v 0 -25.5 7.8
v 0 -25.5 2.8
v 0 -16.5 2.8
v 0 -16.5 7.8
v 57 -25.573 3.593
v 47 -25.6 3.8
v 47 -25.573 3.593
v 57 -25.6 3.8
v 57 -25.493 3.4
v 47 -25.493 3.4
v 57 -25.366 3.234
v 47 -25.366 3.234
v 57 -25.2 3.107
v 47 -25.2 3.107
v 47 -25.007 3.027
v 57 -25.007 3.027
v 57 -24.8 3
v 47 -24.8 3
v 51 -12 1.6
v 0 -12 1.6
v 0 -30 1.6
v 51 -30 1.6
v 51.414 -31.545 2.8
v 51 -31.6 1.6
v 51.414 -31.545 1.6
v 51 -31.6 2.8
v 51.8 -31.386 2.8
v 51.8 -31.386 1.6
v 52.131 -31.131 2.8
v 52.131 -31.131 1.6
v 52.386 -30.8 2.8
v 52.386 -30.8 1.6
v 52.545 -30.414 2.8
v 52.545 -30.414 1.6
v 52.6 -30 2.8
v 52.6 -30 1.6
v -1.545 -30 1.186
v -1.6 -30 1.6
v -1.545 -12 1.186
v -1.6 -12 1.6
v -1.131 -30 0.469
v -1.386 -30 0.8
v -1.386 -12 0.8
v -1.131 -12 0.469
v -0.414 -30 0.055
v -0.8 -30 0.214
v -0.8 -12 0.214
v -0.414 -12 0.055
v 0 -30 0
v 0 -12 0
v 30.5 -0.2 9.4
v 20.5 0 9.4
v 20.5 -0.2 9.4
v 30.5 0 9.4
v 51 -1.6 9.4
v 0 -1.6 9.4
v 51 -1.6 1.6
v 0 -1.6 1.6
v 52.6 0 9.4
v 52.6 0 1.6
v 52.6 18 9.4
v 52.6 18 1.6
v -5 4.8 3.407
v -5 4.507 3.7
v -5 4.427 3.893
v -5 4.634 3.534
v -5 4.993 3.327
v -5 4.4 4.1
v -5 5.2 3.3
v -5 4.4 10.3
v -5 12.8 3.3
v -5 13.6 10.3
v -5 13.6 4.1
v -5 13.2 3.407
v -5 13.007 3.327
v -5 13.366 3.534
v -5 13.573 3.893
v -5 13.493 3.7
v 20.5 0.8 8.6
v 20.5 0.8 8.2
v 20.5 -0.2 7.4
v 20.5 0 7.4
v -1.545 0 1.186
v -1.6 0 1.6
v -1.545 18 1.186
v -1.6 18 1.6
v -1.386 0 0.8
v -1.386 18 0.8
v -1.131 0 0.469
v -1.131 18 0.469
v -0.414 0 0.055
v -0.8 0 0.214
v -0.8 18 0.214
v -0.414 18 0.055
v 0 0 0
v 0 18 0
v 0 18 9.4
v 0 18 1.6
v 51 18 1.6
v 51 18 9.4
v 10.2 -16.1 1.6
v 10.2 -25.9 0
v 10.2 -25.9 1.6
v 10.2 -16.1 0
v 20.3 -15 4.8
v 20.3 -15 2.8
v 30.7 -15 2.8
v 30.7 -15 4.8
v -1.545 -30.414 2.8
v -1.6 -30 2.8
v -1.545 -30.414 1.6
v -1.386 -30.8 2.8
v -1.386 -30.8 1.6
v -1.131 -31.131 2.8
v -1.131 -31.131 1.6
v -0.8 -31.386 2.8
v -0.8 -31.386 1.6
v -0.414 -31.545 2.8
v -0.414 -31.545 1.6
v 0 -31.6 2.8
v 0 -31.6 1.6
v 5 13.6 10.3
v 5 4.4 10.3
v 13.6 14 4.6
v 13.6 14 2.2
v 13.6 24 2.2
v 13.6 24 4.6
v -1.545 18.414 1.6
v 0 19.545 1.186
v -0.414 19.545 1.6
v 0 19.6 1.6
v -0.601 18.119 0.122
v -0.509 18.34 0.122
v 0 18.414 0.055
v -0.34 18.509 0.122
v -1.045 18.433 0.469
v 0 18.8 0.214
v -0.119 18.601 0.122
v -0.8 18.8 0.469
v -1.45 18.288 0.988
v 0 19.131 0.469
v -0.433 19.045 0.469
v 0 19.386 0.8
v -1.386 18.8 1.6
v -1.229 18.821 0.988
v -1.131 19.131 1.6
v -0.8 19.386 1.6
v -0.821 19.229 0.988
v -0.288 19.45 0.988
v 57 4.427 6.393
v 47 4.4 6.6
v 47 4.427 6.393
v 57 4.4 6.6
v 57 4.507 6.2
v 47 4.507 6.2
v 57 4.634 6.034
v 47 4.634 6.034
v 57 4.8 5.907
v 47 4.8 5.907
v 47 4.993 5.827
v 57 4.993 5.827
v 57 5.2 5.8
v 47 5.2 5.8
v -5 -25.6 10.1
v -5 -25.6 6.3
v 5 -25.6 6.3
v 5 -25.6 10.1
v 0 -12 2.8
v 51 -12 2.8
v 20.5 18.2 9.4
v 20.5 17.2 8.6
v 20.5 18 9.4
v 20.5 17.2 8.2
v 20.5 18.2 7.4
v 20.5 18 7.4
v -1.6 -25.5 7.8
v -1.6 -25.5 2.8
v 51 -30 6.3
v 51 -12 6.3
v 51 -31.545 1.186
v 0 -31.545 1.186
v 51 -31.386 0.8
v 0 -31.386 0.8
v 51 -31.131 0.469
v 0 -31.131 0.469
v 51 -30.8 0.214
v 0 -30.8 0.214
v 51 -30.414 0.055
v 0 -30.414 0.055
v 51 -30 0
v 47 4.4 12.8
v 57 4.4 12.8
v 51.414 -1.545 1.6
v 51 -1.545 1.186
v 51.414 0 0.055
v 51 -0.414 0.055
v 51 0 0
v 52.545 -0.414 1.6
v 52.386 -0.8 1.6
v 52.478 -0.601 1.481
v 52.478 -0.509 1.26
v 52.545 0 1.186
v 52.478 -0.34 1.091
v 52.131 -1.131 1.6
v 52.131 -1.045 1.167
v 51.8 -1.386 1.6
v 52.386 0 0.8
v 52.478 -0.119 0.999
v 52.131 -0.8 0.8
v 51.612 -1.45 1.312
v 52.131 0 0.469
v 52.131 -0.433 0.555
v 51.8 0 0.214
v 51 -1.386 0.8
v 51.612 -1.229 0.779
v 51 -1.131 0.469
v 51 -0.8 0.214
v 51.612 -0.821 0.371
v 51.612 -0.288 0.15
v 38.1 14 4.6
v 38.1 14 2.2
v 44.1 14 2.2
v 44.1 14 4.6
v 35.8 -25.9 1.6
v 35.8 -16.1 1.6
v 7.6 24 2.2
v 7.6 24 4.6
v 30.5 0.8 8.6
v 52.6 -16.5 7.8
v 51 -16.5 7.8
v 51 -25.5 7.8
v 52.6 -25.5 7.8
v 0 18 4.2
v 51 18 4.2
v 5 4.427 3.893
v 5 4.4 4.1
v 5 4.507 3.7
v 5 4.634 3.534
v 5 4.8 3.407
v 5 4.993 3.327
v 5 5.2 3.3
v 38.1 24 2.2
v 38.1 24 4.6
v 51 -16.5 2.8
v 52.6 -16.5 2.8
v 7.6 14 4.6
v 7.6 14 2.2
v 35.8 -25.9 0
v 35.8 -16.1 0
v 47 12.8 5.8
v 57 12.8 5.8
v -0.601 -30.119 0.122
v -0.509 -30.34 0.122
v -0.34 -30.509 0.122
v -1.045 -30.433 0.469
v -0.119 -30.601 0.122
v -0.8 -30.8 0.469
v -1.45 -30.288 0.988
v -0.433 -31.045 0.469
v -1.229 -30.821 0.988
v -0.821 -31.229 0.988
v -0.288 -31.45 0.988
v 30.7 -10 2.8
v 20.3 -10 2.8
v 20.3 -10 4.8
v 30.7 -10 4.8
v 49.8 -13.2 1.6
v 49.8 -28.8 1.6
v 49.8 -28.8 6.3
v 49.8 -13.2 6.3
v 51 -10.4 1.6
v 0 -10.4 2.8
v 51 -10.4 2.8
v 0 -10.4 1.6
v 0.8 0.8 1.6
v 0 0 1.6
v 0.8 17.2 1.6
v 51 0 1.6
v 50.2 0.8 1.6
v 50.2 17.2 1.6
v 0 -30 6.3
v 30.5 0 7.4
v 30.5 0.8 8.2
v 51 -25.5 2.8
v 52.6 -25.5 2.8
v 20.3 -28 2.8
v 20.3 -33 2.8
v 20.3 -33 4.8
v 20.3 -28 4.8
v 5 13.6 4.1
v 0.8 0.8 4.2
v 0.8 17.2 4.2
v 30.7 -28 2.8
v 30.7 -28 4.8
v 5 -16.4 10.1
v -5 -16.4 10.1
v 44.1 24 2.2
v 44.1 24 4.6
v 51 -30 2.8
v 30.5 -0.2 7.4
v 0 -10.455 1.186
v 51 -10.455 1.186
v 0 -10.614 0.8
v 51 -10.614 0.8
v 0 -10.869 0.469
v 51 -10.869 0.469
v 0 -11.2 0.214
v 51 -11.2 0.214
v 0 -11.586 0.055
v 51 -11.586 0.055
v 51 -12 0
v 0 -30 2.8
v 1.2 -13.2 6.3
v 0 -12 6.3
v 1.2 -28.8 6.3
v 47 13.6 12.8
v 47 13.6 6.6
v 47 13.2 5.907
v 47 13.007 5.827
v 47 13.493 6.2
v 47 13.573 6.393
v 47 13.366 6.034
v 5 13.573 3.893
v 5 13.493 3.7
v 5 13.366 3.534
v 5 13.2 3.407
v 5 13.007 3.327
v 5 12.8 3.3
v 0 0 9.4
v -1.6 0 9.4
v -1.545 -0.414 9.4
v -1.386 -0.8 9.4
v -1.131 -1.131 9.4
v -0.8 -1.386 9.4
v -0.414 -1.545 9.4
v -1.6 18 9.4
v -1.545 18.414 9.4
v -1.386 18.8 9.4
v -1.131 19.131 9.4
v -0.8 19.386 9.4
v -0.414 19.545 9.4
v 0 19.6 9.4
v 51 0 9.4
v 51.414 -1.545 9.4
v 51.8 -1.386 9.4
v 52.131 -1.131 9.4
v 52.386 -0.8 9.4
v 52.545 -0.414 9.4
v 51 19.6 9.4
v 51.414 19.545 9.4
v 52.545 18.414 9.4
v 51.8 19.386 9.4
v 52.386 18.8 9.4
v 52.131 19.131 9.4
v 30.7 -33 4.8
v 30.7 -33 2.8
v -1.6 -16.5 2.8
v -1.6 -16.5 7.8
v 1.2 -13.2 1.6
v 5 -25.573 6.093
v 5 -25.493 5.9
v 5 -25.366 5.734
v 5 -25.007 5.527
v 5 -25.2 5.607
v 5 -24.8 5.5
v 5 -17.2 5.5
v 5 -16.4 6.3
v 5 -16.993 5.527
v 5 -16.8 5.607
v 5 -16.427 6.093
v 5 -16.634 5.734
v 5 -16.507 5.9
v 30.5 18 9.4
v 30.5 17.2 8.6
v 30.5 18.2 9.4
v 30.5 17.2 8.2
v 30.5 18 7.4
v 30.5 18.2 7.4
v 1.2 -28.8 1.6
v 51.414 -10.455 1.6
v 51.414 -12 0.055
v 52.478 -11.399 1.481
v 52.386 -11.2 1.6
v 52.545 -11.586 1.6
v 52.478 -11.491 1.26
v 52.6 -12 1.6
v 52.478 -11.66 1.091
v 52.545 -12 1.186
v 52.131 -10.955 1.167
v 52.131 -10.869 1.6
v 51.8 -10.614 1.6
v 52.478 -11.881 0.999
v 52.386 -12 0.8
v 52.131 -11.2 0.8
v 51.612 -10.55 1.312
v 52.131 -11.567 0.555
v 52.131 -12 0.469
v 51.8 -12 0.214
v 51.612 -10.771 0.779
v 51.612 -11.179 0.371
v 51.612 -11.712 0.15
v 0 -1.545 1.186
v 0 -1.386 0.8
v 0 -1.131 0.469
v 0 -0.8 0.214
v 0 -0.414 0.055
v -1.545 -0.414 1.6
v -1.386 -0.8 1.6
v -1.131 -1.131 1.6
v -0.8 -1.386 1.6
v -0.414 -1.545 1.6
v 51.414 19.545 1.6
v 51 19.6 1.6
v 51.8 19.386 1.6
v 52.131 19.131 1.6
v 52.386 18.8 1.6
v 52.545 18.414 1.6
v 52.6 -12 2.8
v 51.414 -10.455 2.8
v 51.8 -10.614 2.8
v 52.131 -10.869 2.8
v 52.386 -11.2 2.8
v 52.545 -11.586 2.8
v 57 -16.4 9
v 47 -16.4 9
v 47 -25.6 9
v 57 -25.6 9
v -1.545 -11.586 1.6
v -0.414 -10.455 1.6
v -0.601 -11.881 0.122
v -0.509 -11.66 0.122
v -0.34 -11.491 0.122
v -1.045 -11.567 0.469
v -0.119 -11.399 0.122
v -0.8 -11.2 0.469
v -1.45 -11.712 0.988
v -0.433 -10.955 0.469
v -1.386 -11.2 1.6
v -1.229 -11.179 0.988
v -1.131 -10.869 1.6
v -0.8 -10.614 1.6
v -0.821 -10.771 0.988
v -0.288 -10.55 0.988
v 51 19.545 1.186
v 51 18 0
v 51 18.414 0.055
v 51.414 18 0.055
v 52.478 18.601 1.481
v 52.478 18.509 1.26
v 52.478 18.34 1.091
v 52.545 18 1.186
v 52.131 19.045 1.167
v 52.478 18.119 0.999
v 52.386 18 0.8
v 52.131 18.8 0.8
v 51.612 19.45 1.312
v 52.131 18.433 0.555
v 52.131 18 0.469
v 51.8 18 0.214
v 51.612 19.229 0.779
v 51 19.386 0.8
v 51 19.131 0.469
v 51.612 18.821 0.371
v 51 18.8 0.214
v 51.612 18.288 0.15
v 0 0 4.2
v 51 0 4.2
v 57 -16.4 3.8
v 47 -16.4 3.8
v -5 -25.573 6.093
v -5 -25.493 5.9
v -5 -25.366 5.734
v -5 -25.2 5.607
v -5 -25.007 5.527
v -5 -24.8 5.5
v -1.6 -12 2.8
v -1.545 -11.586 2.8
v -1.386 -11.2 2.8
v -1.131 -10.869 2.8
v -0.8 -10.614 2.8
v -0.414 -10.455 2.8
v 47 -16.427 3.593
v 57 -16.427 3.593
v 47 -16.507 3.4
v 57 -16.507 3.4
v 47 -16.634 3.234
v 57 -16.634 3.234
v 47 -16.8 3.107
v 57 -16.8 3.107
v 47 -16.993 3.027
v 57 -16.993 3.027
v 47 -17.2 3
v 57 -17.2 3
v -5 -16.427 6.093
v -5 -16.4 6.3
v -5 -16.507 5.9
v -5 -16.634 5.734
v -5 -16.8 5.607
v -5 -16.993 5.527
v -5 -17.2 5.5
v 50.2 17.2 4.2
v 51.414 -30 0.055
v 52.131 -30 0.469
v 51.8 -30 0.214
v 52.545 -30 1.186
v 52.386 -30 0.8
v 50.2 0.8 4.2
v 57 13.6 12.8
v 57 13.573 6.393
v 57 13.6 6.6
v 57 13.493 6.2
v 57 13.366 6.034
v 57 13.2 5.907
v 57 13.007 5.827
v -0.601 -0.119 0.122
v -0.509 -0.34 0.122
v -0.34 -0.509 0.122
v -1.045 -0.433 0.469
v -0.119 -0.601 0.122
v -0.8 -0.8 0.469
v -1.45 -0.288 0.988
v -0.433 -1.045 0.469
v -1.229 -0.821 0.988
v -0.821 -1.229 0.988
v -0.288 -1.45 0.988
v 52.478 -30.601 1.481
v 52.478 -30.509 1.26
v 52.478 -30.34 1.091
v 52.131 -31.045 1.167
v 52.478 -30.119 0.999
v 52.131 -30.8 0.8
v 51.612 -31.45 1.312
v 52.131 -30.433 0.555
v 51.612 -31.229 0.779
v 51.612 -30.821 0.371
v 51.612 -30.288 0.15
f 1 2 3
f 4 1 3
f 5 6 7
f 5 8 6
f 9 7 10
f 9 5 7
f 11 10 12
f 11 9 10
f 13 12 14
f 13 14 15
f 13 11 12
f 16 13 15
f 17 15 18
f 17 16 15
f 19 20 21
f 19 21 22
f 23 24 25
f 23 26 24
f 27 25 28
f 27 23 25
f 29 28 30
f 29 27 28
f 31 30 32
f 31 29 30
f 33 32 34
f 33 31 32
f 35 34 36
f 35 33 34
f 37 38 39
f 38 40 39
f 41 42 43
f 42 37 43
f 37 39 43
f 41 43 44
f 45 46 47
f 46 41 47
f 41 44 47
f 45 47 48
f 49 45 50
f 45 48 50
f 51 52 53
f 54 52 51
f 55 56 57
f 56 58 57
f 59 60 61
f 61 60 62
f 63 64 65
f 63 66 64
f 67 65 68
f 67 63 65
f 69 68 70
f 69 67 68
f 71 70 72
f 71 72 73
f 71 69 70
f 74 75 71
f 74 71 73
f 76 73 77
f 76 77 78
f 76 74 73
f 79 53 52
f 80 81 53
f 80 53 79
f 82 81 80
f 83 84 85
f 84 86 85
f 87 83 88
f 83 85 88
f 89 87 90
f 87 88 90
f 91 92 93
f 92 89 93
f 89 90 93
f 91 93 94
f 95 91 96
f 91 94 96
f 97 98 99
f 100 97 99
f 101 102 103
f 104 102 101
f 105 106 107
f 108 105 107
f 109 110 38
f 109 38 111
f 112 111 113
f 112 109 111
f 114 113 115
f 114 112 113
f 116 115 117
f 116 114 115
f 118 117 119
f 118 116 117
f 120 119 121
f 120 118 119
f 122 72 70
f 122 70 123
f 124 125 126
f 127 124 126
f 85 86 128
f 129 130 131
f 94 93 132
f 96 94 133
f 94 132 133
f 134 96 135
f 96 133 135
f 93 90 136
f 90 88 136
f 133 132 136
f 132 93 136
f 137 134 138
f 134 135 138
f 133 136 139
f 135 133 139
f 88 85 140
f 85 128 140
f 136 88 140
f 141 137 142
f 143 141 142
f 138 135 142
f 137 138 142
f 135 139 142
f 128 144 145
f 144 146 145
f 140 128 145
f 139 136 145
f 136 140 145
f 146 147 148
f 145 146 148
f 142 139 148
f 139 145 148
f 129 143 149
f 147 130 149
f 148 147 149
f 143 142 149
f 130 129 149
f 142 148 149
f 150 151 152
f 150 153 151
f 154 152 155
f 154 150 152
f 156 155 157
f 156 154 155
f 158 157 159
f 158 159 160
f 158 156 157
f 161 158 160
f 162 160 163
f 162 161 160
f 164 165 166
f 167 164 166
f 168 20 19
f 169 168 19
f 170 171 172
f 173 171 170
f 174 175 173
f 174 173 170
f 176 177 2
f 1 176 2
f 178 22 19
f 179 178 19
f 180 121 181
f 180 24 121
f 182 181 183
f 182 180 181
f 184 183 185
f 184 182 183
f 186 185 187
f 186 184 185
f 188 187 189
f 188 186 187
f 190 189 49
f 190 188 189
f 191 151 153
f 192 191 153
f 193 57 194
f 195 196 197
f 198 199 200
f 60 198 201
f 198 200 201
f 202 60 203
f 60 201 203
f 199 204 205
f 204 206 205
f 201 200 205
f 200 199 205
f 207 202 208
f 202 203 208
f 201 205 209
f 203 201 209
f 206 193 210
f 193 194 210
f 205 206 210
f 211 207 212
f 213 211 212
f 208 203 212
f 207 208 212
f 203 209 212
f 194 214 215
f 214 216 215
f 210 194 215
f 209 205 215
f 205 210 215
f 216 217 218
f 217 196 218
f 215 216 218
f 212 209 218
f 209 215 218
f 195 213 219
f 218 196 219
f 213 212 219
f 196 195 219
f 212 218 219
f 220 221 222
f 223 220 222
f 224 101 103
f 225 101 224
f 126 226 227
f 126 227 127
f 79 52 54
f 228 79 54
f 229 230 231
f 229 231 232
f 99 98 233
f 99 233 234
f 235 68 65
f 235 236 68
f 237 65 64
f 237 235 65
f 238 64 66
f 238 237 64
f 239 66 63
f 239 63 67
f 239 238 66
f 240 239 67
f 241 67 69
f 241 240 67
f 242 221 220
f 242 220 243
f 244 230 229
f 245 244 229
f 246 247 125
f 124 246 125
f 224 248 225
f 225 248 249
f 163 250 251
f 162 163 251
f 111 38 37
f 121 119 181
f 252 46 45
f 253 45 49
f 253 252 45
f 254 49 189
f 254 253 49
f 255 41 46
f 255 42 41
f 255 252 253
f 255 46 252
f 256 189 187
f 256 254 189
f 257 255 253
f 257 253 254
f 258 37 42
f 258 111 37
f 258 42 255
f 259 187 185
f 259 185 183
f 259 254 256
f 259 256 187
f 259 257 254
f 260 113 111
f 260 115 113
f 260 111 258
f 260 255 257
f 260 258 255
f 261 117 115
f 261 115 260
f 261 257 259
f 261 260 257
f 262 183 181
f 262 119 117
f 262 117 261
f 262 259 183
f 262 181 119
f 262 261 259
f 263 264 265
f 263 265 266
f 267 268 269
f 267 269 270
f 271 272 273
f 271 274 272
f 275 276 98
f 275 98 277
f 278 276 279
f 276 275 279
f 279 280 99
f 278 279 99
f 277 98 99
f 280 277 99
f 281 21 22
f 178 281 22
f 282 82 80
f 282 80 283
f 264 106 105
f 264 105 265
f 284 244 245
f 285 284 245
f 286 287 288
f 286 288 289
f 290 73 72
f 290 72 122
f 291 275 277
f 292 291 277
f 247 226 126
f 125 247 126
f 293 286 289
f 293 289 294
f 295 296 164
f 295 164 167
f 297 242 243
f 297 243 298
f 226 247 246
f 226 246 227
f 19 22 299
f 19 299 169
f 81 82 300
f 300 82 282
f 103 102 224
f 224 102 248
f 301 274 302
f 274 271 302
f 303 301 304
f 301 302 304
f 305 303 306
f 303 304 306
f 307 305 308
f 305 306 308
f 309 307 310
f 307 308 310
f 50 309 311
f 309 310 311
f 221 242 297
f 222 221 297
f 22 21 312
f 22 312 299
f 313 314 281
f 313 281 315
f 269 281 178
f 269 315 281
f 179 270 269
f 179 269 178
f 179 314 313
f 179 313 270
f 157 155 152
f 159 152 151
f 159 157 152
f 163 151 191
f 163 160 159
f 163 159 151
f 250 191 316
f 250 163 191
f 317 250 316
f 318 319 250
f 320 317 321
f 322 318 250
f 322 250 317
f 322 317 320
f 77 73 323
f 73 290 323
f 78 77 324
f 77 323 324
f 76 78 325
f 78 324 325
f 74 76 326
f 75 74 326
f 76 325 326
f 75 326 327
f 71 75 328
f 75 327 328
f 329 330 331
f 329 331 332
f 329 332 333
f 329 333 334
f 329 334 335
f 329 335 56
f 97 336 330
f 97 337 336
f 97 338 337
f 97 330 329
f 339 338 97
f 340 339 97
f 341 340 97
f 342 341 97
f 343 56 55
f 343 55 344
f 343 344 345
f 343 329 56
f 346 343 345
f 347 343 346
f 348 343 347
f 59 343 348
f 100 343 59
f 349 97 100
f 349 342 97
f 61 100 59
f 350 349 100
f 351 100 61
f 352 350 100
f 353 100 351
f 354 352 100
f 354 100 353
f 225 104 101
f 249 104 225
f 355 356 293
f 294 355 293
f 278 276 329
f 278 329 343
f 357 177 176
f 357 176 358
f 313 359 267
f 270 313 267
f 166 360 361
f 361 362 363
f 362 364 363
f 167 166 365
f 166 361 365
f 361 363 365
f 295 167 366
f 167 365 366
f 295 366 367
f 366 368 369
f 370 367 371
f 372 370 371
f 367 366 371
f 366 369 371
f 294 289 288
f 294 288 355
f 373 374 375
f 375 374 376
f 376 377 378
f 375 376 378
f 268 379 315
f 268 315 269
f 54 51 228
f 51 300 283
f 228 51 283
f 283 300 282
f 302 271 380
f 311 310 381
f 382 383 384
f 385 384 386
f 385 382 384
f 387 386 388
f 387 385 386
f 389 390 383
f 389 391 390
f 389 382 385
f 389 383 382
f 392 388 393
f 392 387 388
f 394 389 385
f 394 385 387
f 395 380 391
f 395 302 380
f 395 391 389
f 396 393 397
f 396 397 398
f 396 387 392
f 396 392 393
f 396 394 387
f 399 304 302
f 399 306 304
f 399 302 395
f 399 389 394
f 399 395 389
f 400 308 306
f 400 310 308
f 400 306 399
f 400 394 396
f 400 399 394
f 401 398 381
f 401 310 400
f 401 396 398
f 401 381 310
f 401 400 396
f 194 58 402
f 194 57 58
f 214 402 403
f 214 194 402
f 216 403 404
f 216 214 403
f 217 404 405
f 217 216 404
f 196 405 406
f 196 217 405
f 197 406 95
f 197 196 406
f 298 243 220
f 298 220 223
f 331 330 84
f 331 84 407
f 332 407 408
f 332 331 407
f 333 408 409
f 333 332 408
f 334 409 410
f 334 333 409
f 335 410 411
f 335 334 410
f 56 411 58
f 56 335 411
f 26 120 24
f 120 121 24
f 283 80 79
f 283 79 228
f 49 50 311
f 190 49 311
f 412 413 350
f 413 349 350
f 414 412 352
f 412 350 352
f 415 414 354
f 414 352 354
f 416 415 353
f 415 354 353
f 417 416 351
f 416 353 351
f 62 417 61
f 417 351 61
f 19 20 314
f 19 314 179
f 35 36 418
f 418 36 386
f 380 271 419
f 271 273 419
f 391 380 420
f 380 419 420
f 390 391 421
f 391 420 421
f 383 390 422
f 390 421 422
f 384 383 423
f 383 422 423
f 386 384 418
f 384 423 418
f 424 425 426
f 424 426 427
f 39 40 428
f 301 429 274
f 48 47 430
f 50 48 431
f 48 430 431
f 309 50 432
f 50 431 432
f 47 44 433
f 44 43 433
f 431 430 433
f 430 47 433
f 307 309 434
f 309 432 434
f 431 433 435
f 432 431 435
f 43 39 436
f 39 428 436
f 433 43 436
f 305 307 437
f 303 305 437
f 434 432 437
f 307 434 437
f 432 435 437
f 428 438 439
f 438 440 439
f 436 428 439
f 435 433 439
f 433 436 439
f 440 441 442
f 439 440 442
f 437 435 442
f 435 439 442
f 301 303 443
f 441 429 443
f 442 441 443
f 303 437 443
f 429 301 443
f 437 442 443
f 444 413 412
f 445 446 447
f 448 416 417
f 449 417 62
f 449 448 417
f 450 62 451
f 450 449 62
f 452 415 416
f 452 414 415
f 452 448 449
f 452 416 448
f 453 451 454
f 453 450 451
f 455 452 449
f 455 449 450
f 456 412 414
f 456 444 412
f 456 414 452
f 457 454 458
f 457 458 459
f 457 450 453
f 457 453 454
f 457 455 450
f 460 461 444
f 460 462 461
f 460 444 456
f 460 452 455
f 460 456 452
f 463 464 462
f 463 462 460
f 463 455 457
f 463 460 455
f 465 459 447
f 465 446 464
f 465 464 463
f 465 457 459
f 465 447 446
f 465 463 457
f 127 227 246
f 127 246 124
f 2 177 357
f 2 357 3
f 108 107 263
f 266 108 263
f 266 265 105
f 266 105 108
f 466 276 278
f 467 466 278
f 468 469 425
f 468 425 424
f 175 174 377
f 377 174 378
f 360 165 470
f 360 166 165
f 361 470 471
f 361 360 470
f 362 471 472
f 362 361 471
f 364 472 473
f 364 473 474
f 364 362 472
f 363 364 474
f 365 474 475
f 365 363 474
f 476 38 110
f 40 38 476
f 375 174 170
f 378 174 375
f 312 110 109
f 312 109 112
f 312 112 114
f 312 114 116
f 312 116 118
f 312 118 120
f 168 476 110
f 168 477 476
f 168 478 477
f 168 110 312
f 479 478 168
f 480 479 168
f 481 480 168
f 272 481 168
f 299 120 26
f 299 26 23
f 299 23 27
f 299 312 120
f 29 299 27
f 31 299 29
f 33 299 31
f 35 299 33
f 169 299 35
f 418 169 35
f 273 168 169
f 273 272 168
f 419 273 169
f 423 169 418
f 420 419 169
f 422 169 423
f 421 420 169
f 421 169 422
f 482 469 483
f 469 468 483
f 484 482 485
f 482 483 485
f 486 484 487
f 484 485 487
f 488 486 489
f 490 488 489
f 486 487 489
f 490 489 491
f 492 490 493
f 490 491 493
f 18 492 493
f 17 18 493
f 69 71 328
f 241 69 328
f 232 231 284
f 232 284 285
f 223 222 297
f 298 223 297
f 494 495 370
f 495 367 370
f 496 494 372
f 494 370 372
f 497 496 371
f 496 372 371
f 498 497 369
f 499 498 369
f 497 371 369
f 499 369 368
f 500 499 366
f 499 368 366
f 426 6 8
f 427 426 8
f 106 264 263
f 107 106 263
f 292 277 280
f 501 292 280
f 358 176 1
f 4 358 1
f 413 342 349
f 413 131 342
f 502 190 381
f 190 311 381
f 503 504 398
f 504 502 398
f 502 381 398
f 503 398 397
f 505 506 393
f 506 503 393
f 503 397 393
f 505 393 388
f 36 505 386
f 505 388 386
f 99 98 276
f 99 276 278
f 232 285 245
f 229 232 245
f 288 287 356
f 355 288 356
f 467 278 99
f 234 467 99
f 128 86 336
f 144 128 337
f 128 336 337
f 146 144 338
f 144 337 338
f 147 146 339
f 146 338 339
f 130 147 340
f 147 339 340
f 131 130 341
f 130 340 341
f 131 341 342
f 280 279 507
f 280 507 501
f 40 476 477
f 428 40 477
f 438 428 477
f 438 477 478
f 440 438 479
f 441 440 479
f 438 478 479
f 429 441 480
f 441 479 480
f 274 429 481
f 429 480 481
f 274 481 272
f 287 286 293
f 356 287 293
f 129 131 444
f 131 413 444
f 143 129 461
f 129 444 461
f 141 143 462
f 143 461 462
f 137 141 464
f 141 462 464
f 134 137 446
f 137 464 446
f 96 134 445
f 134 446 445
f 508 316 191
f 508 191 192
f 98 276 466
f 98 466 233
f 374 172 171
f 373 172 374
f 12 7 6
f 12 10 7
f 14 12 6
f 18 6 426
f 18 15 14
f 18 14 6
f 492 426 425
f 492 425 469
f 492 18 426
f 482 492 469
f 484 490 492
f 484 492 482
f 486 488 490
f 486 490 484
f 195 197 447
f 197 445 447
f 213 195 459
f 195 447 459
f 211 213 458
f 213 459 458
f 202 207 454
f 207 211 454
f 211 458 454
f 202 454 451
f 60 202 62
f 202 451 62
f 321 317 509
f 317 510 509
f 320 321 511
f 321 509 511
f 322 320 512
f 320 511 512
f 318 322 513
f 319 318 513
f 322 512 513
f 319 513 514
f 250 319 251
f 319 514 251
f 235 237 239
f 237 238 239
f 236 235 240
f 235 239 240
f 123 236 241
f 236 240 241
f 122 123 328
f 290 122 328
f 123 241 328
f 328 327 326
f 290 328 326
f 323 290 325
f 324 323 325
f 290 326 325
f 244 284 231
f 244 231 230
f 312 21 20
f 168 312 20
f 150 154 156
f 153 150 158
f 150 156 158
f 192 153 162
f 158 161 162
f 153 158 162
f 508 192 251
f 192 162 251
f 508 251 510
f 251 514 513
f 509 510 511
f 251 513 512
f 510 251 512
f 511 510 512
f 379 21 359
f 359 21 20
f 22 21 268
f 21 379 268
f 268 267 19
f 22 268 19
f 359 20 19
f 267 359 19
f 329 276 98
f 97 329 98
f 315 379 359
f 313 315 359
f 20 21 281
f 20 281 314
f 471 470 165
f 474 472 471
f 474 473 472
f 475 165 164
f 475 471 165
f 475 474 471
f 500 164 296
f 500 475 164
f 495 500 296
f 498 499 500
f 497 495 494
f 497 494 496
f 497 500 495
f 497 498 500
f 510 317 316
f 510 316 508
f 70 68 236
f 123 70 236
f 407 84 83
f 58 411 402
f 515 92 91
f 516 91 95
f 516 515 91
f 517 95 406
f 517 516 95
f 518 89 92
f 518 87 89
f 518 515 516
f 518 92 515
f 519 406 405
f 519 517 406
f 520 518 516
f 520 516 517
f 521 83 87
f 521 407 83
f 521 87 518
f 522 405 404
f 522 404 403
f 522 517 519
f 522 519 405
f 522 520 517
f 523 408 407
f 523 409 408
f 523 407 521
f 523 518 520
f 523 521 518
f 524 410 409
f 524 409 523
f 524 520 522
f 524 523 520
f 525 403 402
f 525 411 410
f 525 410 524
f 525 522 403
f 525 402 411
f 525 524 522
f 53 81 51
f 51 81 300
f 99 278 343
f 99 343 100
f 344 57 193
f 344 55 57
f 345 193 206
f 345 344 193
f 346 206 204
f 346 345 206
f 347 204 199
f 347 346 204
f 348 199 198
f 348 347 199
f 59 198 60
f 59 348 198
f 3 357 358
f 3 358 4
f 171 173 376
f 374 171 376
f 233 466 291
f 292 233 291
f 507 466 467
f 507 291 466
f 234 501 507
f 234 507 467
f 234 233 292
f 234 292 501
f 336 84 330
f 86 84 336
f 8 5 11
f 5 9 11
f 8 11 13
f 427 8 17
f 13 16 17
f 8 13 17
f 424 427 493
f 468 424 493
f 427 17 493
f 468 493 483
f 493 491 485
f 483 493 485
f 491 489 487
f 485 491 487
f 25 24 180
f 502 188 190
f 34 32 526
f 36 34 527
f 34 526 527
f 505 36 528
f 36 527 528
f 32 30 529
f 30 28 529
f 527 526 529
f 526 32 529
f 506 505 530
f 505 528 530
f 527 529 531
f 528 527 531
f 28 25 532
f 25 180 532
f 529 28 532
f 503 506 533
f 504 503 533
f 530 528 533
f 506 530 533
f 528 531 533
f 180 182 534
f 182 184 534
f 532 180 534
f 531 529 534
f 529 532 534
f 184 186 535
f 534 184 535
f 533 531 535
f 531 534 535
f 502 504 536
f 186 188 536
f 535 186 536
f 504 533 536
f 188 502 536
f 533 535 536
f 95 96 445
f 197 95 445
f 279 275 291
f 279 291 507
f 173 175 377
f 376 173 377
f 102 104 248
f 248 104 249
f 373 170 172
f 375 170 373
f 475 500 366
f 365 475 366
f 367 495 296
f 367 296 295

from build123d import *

# Parameters (mm, degrees)
BOX001_W        = 51
BOX001_H        = 18
BOX001_DEPTH    = 9.4
BOX_W           = 54.2
BOX_H           = 21.2
BOX_DEPTH       = 9.4
FILLET_R        = 1.6
BOX003_W        = 49.4
BOX003_H        = 16.4
BOX003_DEPTH    = 2.6
BOX002_W        = 51
BOX002_H        = 18
BOX002_DEPTH    = 2.6
BOX004_W        = 10
BOX004_H        = 1
BOX004_DEPTH    = 2
CHAMFER_SIZE    = 0.8
BOX005_W        = 10
BOX005_H        = 1
BOX005_DEPTH    = 2
CHAMFER001_SIZE = 0.8
BOX008_W        = 6
BOX008_H        = 10
BOX008_DEPTH    = 2.4
BOX009_W        = 6
BOX009_H        = 10
BOX009_DEPTH    = 2.4
BOX011_W        = 51
BOX011_H        = 18
BOX011_DEPTH    = 9.4
BOX010_W        = 54.2
BOX010_H        = 21.2
BOX010_DEPTH    = 2.8
FILLET001_R     = 1.6
BOX013_W        = 48.6
BOX013_H        = 15.6
BOX013_DEPTH    = 4.8
BOX012_W        = 51
BOX012_H        = 18
BOX012_DEPTH    = 4.7
BOX014_W        = 25.6
BOX014_H        = 9.8
BOX014_DEPTH    = 1.6
BOX017_W        = 10.4
BOX017_H        = 5
BOX017_DEPTH    = 2
BOX018_W        = 10.4
BOX018_H        = 5
BOX018_DEPTH    = 2
BOX006_W        = 10
BOX006_H        = 9.2
BOX006_DEPTH    = 7
FILLET002_R     = 0.8
BOX019_W        = 10
BOX019_H        = 9.2
BOX019_DEPTH    = 7
FILLET003_R     = 0.8
BOX022_W        = 1.6
BOX022_H        = 9
BOX022_DEPTH    = 5
BOX023_W        = 1.6
BOX023_H        = 9
BOX023_DEPTH    = 5
BOX020_W        = 10
BOX020_H        = 9.2
BOX020_DEPTH    = 4.6
FILLET004_R     = 0.8
BOX021_W        = 10
BOX021_H        = 9.2
BOX021_DEPTH    = 6
FILLET005_R     = 0.8


with BuildPart() as unten_innen:
    # Box001 → Box001 (new body)
    with BuildSketch(Plane.XY.offset(1.6)):
        with Locations((25.5, 9)):
            Rectangle(BOX001_W, BOX001_H)
    extrude(amount=BOX001_DEPTH)


with BuildPart() as schale_unten:
    # Box → Box (new body)
    with BuildSketch(Plane(origin=(-1.6, -1.6, 0), x_dir=(1, 0, 0), z_dir=(0, 0, 1))):
        with Locations((27.1, 10.6)):
            Rectangle(BOX_W, BOX_H)
    extrude(amount=BOX_DEPTH)

    # Cut: cut unten_innen
    add(unten_innen.part, mode=Mode.SUBTRACT)

    # Fillet
    fillet_edges = [schale_unten.edges().sort_by_distance(p)[0] for p in [
        (-1.6, -1.6, 4.7),
        (-1.6, 19.6, 4.7),
        (-1.6, 9, 0),
        (25.5, -1.6, 0),
        (52.6, -1.6, 4.7),
        (25.5, 19.6, 0),
        (52.6, 19.6, 4.7),
        (52.6, 9, 0),
    ]]
    fillet(fillet_edges, radius=FILLET_R)


with BuildPart() as auflage_innen:
    # Box003 → Box003 (new body)
    with BuildSketch(Plane(origin=(0.8, 0.8, 1.6), x_dir=(1, 0, 0), z_dir=(0, 0, 1))):
        with Locations((24.7, 8.2)):
            Rectangle(BOX003_W, BOX003_H)
    extrude(amount=BOX003_DEPTH)


with BuildPart() as auflage:
    # Box002 → Box002 (new body)
    with BuildSketch(Plane.XY.offset(1.6)):
        with Locations((25.5, 9)):
            Rectangle(BOX002_W, BOX002_H)
    extrude(amount=BOX002_DEPTH)

    # Cut001: cut Auflage_innen
    add(auflage_innen.part, mode=Mode.SUBTRACT)


with BuildPart() as haken1:
    # Box004 → Box004 (new body)
    with BuildSketch(Plane(origin=(20.5, -0.2, 7.4), x_dir=(1, 0, 0), z_dir=(0, 0, 1))):
        with Locations((5, 0.5)):
            Rectangle(BOX004_W, BOX004_H)
    extrude(amount=BOX004_DEPTH)

    # Chamfer
    chamfer_edges = [haken1.edges().sort_by_distance(p)[0] for p in [
        (25.5, 0.8, 7.4),
        (25.5, 0.8, 9.4),
    ]]
    chamfer(chamfer_edges, length=CHAMFER_SIZE)


with BuildPart() as haken2:
    # Box005 → Box005 (new body)
    with BuildSketch(Plane(origin=(20.5, 17.2, 7.4), x_dir=(1, 0, 0), z_dir=(0, 0, 1))):
        with Locations((5, 0.5)):
            Rectangle(BOX005_W, BOX005_H)
    extrude(amount=BOX005_DEPTH)

    # Chamfer001
    chamfer001_edges = [haken2.edges().sort_by_distance(p)[0] for p in [
        (25.5, 17.2, 7.4),
        (25.5, 17.2, 9.4),
    ]]
    chamfer(chamfer001_edges, length=CHAMFER001_SIZE)


with BuildPart() as button1:
    # Box008 → Box008 (new body)
    with BuildSketch(Plane(origin=(7.6, 14, 2.2), x_dir=(1, 0, 0), z_dir=(0, 0, 1))):
        with Locations((3, 5)):
            Rectangle(BOX008_W, BOX008_H)
    extrude(amount=BOX008_DEPTH)


with BuildPart() as button2:
    # Box009 → Box009 (new body)
    with BuildSketch(Plane(origin=(38.1, 14, 2.2), x_dir=(1, 0, 0), z_dir=(0, 0, 1))):
        with Locations((3, 5)):
            Rectangle(BOX009_W, BOX009_H)
    extrude(amount=BOX009_DEPTH)


with BuildPart() as oben_innen:
    # Box011 → Box011 (new body)
    with BuildSketch(Plane(origin=(0, -30, 1.6), x_dir=(1, 0, 0), z_dir=(0, 0, 1))):
        with Locations((25.5, 9)):
            Rectangle(BOX011_W, BOX011_H)
    extrude(amount=BOX011_DEPTH)


with BuildPart() as schale_oben:
    # Box010 → Box010 (new body)
    with BuildSketch(Plane(origin=(-1.6, -31.6, 0), x_dir=(1, 0, 0), z_dir=(0, 0, 1))):
        with Locations((27.1, 10.6)):
            Rectangle(BOX010_W, BOX010_H)
    extrude(amount=BOX010_DEPTH)

    # Cut002: cut oben_innen
    add(oben_innen.part, mode=Mode.SUBTRACT)

    # Fillet001
    fillet001_edges = [schale_oben.edges().sort_by_distance(p)[0] for p in [
        (-1.6, -31.6, 1.4),
        (-1.6, -10.4, 1.4),
        (-1.6, -21, 0),
        (25.5, -31.6, 0),
        (52.6, -31.6, 1.4),
        (25.5, -10.4, 0),
        (52.6, -10.4, 1.4),
        (52.6, -21, 0),
    ]]
    fillet(fillet001_edges, radius=FILLET001_R)


with BuildPart() as rahmen_innen:
    # Box013 → Box013 (new body)
    with BuildSketch(Plane(origin=(1.2, -28.8, 1.6), x_dir=(1, 0, 0), z_dir=(0, 0, 1))):
        with Locations((24.3, 7.8)):
            Rectangle(BOX013_W, BOX013_H)
    extrude(amount=BOX013_DEPTH)


with BuildPart() as rahmen:
    # Box012 → Box012 (new body)
    with BuildSketch(Plane(origin=(0, -30, 1.6), x_dir=(1, 0, 0), z_dir=(0, 0, 1))):
        with Locations((25.5, 9)):
            Rectangle(BOX012_W, BOX012_H)
    extrude(amount=BOX012_DEPTH)

    # Cut003: cut Rahmen_innen
    add(rahmen_innen.part, mode=Mode.SUBTRACT)


with BuildPart() as oled:
    # Box014 → Box014 (new body)
    with BuildSketch(Plane(origin=(10.2, -25.9, 0), x_dir=(1, 0, 0), z_dir=(0, 0, 1))):
        with Locations((12.8, 4.9)):
            Rectangle(BOX014_W, BOX014_H)
    extrude(amount=BOX014_DEPTH)


with BuildPart() as oese1:
    # Box017 → Box017 (new body)
    with BuildSketch(Plane(origin=(20.3, -33, 2.8), x_dir=(1, 0, 0), z_dir=(0, 0, 1))):
        with Locations((5.2, 2.5)):
            Rectangle(BOX017_W, BOX017_H)
    extrude(amount=BOX017_DEPTH)


with BuildPart() as oese2:
    # Box018 → Box018 (new body)
    with BuildSketch(Plane(origin=(20.3, -15, 2.8), x_dir=(1, 0, 0), z_dir=(0, 0, 1))):
        with Locations((5.2, 2.5)):
            Rectangle(BOX018_W, BOX018_H)
    extrude(amount=BOX018_DEPTH)


with BuildPart() as usb_buchse1:
    # Box006 → Box006 (new body)
    with BuildSketch(Plane(origin=(-5, 4.4, 3.3), x_dir=(1, 0, 0), z_dir=(0, 0, 1))):
        with Locations((5, 4.6)):
            Rectangle(BOX006_W, BOX006_H)
    extrude(amount=BOX006_DEPTH)

    # Fillet002
    fillet002_edges = [usb_buchse1.edges().sort_by_distance(p)[0] for p in [
        (0, 4.4, 3.3),
        (0, 13.6, 3.3),
    ]]
    fillet(fillet002_edges, radius=FILLET002_R)


with BuildPart() as usb_buchse2:
    # Box019 → Box019 (new body)
    with BuildSketch(Plane(origin=(47, 4.4, 5.8), x_dir=(1, 0, 0), z_dir=(0, 0, 1))):
        with Locations((5, 4.6)):
            Rectangle(BOX019_W, BOX019_H)
    extrude(amount=BOX019_DEPTH)

    # Fillet003
    fillet003_edges = [usb_buchse2.edges().sort_by_distance(p)[0] for p in [
        (52, 4.4, 5.8),
        (52, 13.6, 5.8),
    ]]
    fillet(fillet003_edges, radius=FILLET003_R)


with BuildPart() as nut1:
    # Box022 → Box022 (new body)
    with BuildSketch(Plane(origin=(-1.6, -25.5, 2.8), x_dir=(1, 0, 0), z_dir=(0, 0, 1))):
        with Locations((0.8, 4.5)):
            Rectangle(BOX022_W, BOX022_H)
    extrude(amount=BOX022_DEPTH)


with BuildPart() as nut2:
    # Box023 → Box023 (new body)
    with BuildSketch(Plane(origin=(51, -25.5, 2.8), x_dir=(1, 0, 0), z_dir=(0, 0, 1))):
        with Locations((0.8, 4.5)):
            Rectangle(BOX023_W, BOX023_H)
    extrude(amount=BOX023_DEPTH)


with BuildPart() as usb_buchse3:
    # Box020 → Box020 (new body)
    with BuildSketch(Plane(origin=(-5, -25.6, 5.5), x_dir=(1, 0, 0), z_dir=(0, 0, 1))):
        with Locations((5, 4.6)):
            Rectangle(BOX020_W, BOX020_H)
    extrude(amount=BOX020_DEPTH)

    # Fillet004
    fillet004_edges = [usb_buchse3.edges().sort_by_distance(p)[0] for p in [
        (0, -25.6, 5.5),
        (0, -16.4, 5.5),
    ]]
    fillet(fillet004_edges, radius=FILLET004_R)


with BuildPart() as usb_buchse4:
    # Box021 → Box021 (new body)
    with BuildSketch(Plane(origin=(47, -25.6, 3), x_dir=(1, 0, 0), z_dir=(0, 0, 1))):
        with Locations((5, 4.6)):
            Rectangle(BOX021_W, BOX021_H)
    extrude(amount=BOX021_DEPTH)

    # Fillet005
    fillet005_edges = [usb_buchse4.edges().sort_by_distance(p)[0] for p in [
        (52, -25.6, 3),
        (52, -16.4, 3),
    ]]
    fillet(fillet005_edges, radius=FILLET005_R)


solid = Compound([schale_unten.part, auflage.part, haken1.part, haken2.part, button1.part, button2.part, schale_oben.part, rahmen.part, oled.part, oese1.part, oese2.part, usb_buchse1.part, usb_buchse2.part, nut1.part, nut2.part, usb_buchse3.part, usb_buchse4.part])
